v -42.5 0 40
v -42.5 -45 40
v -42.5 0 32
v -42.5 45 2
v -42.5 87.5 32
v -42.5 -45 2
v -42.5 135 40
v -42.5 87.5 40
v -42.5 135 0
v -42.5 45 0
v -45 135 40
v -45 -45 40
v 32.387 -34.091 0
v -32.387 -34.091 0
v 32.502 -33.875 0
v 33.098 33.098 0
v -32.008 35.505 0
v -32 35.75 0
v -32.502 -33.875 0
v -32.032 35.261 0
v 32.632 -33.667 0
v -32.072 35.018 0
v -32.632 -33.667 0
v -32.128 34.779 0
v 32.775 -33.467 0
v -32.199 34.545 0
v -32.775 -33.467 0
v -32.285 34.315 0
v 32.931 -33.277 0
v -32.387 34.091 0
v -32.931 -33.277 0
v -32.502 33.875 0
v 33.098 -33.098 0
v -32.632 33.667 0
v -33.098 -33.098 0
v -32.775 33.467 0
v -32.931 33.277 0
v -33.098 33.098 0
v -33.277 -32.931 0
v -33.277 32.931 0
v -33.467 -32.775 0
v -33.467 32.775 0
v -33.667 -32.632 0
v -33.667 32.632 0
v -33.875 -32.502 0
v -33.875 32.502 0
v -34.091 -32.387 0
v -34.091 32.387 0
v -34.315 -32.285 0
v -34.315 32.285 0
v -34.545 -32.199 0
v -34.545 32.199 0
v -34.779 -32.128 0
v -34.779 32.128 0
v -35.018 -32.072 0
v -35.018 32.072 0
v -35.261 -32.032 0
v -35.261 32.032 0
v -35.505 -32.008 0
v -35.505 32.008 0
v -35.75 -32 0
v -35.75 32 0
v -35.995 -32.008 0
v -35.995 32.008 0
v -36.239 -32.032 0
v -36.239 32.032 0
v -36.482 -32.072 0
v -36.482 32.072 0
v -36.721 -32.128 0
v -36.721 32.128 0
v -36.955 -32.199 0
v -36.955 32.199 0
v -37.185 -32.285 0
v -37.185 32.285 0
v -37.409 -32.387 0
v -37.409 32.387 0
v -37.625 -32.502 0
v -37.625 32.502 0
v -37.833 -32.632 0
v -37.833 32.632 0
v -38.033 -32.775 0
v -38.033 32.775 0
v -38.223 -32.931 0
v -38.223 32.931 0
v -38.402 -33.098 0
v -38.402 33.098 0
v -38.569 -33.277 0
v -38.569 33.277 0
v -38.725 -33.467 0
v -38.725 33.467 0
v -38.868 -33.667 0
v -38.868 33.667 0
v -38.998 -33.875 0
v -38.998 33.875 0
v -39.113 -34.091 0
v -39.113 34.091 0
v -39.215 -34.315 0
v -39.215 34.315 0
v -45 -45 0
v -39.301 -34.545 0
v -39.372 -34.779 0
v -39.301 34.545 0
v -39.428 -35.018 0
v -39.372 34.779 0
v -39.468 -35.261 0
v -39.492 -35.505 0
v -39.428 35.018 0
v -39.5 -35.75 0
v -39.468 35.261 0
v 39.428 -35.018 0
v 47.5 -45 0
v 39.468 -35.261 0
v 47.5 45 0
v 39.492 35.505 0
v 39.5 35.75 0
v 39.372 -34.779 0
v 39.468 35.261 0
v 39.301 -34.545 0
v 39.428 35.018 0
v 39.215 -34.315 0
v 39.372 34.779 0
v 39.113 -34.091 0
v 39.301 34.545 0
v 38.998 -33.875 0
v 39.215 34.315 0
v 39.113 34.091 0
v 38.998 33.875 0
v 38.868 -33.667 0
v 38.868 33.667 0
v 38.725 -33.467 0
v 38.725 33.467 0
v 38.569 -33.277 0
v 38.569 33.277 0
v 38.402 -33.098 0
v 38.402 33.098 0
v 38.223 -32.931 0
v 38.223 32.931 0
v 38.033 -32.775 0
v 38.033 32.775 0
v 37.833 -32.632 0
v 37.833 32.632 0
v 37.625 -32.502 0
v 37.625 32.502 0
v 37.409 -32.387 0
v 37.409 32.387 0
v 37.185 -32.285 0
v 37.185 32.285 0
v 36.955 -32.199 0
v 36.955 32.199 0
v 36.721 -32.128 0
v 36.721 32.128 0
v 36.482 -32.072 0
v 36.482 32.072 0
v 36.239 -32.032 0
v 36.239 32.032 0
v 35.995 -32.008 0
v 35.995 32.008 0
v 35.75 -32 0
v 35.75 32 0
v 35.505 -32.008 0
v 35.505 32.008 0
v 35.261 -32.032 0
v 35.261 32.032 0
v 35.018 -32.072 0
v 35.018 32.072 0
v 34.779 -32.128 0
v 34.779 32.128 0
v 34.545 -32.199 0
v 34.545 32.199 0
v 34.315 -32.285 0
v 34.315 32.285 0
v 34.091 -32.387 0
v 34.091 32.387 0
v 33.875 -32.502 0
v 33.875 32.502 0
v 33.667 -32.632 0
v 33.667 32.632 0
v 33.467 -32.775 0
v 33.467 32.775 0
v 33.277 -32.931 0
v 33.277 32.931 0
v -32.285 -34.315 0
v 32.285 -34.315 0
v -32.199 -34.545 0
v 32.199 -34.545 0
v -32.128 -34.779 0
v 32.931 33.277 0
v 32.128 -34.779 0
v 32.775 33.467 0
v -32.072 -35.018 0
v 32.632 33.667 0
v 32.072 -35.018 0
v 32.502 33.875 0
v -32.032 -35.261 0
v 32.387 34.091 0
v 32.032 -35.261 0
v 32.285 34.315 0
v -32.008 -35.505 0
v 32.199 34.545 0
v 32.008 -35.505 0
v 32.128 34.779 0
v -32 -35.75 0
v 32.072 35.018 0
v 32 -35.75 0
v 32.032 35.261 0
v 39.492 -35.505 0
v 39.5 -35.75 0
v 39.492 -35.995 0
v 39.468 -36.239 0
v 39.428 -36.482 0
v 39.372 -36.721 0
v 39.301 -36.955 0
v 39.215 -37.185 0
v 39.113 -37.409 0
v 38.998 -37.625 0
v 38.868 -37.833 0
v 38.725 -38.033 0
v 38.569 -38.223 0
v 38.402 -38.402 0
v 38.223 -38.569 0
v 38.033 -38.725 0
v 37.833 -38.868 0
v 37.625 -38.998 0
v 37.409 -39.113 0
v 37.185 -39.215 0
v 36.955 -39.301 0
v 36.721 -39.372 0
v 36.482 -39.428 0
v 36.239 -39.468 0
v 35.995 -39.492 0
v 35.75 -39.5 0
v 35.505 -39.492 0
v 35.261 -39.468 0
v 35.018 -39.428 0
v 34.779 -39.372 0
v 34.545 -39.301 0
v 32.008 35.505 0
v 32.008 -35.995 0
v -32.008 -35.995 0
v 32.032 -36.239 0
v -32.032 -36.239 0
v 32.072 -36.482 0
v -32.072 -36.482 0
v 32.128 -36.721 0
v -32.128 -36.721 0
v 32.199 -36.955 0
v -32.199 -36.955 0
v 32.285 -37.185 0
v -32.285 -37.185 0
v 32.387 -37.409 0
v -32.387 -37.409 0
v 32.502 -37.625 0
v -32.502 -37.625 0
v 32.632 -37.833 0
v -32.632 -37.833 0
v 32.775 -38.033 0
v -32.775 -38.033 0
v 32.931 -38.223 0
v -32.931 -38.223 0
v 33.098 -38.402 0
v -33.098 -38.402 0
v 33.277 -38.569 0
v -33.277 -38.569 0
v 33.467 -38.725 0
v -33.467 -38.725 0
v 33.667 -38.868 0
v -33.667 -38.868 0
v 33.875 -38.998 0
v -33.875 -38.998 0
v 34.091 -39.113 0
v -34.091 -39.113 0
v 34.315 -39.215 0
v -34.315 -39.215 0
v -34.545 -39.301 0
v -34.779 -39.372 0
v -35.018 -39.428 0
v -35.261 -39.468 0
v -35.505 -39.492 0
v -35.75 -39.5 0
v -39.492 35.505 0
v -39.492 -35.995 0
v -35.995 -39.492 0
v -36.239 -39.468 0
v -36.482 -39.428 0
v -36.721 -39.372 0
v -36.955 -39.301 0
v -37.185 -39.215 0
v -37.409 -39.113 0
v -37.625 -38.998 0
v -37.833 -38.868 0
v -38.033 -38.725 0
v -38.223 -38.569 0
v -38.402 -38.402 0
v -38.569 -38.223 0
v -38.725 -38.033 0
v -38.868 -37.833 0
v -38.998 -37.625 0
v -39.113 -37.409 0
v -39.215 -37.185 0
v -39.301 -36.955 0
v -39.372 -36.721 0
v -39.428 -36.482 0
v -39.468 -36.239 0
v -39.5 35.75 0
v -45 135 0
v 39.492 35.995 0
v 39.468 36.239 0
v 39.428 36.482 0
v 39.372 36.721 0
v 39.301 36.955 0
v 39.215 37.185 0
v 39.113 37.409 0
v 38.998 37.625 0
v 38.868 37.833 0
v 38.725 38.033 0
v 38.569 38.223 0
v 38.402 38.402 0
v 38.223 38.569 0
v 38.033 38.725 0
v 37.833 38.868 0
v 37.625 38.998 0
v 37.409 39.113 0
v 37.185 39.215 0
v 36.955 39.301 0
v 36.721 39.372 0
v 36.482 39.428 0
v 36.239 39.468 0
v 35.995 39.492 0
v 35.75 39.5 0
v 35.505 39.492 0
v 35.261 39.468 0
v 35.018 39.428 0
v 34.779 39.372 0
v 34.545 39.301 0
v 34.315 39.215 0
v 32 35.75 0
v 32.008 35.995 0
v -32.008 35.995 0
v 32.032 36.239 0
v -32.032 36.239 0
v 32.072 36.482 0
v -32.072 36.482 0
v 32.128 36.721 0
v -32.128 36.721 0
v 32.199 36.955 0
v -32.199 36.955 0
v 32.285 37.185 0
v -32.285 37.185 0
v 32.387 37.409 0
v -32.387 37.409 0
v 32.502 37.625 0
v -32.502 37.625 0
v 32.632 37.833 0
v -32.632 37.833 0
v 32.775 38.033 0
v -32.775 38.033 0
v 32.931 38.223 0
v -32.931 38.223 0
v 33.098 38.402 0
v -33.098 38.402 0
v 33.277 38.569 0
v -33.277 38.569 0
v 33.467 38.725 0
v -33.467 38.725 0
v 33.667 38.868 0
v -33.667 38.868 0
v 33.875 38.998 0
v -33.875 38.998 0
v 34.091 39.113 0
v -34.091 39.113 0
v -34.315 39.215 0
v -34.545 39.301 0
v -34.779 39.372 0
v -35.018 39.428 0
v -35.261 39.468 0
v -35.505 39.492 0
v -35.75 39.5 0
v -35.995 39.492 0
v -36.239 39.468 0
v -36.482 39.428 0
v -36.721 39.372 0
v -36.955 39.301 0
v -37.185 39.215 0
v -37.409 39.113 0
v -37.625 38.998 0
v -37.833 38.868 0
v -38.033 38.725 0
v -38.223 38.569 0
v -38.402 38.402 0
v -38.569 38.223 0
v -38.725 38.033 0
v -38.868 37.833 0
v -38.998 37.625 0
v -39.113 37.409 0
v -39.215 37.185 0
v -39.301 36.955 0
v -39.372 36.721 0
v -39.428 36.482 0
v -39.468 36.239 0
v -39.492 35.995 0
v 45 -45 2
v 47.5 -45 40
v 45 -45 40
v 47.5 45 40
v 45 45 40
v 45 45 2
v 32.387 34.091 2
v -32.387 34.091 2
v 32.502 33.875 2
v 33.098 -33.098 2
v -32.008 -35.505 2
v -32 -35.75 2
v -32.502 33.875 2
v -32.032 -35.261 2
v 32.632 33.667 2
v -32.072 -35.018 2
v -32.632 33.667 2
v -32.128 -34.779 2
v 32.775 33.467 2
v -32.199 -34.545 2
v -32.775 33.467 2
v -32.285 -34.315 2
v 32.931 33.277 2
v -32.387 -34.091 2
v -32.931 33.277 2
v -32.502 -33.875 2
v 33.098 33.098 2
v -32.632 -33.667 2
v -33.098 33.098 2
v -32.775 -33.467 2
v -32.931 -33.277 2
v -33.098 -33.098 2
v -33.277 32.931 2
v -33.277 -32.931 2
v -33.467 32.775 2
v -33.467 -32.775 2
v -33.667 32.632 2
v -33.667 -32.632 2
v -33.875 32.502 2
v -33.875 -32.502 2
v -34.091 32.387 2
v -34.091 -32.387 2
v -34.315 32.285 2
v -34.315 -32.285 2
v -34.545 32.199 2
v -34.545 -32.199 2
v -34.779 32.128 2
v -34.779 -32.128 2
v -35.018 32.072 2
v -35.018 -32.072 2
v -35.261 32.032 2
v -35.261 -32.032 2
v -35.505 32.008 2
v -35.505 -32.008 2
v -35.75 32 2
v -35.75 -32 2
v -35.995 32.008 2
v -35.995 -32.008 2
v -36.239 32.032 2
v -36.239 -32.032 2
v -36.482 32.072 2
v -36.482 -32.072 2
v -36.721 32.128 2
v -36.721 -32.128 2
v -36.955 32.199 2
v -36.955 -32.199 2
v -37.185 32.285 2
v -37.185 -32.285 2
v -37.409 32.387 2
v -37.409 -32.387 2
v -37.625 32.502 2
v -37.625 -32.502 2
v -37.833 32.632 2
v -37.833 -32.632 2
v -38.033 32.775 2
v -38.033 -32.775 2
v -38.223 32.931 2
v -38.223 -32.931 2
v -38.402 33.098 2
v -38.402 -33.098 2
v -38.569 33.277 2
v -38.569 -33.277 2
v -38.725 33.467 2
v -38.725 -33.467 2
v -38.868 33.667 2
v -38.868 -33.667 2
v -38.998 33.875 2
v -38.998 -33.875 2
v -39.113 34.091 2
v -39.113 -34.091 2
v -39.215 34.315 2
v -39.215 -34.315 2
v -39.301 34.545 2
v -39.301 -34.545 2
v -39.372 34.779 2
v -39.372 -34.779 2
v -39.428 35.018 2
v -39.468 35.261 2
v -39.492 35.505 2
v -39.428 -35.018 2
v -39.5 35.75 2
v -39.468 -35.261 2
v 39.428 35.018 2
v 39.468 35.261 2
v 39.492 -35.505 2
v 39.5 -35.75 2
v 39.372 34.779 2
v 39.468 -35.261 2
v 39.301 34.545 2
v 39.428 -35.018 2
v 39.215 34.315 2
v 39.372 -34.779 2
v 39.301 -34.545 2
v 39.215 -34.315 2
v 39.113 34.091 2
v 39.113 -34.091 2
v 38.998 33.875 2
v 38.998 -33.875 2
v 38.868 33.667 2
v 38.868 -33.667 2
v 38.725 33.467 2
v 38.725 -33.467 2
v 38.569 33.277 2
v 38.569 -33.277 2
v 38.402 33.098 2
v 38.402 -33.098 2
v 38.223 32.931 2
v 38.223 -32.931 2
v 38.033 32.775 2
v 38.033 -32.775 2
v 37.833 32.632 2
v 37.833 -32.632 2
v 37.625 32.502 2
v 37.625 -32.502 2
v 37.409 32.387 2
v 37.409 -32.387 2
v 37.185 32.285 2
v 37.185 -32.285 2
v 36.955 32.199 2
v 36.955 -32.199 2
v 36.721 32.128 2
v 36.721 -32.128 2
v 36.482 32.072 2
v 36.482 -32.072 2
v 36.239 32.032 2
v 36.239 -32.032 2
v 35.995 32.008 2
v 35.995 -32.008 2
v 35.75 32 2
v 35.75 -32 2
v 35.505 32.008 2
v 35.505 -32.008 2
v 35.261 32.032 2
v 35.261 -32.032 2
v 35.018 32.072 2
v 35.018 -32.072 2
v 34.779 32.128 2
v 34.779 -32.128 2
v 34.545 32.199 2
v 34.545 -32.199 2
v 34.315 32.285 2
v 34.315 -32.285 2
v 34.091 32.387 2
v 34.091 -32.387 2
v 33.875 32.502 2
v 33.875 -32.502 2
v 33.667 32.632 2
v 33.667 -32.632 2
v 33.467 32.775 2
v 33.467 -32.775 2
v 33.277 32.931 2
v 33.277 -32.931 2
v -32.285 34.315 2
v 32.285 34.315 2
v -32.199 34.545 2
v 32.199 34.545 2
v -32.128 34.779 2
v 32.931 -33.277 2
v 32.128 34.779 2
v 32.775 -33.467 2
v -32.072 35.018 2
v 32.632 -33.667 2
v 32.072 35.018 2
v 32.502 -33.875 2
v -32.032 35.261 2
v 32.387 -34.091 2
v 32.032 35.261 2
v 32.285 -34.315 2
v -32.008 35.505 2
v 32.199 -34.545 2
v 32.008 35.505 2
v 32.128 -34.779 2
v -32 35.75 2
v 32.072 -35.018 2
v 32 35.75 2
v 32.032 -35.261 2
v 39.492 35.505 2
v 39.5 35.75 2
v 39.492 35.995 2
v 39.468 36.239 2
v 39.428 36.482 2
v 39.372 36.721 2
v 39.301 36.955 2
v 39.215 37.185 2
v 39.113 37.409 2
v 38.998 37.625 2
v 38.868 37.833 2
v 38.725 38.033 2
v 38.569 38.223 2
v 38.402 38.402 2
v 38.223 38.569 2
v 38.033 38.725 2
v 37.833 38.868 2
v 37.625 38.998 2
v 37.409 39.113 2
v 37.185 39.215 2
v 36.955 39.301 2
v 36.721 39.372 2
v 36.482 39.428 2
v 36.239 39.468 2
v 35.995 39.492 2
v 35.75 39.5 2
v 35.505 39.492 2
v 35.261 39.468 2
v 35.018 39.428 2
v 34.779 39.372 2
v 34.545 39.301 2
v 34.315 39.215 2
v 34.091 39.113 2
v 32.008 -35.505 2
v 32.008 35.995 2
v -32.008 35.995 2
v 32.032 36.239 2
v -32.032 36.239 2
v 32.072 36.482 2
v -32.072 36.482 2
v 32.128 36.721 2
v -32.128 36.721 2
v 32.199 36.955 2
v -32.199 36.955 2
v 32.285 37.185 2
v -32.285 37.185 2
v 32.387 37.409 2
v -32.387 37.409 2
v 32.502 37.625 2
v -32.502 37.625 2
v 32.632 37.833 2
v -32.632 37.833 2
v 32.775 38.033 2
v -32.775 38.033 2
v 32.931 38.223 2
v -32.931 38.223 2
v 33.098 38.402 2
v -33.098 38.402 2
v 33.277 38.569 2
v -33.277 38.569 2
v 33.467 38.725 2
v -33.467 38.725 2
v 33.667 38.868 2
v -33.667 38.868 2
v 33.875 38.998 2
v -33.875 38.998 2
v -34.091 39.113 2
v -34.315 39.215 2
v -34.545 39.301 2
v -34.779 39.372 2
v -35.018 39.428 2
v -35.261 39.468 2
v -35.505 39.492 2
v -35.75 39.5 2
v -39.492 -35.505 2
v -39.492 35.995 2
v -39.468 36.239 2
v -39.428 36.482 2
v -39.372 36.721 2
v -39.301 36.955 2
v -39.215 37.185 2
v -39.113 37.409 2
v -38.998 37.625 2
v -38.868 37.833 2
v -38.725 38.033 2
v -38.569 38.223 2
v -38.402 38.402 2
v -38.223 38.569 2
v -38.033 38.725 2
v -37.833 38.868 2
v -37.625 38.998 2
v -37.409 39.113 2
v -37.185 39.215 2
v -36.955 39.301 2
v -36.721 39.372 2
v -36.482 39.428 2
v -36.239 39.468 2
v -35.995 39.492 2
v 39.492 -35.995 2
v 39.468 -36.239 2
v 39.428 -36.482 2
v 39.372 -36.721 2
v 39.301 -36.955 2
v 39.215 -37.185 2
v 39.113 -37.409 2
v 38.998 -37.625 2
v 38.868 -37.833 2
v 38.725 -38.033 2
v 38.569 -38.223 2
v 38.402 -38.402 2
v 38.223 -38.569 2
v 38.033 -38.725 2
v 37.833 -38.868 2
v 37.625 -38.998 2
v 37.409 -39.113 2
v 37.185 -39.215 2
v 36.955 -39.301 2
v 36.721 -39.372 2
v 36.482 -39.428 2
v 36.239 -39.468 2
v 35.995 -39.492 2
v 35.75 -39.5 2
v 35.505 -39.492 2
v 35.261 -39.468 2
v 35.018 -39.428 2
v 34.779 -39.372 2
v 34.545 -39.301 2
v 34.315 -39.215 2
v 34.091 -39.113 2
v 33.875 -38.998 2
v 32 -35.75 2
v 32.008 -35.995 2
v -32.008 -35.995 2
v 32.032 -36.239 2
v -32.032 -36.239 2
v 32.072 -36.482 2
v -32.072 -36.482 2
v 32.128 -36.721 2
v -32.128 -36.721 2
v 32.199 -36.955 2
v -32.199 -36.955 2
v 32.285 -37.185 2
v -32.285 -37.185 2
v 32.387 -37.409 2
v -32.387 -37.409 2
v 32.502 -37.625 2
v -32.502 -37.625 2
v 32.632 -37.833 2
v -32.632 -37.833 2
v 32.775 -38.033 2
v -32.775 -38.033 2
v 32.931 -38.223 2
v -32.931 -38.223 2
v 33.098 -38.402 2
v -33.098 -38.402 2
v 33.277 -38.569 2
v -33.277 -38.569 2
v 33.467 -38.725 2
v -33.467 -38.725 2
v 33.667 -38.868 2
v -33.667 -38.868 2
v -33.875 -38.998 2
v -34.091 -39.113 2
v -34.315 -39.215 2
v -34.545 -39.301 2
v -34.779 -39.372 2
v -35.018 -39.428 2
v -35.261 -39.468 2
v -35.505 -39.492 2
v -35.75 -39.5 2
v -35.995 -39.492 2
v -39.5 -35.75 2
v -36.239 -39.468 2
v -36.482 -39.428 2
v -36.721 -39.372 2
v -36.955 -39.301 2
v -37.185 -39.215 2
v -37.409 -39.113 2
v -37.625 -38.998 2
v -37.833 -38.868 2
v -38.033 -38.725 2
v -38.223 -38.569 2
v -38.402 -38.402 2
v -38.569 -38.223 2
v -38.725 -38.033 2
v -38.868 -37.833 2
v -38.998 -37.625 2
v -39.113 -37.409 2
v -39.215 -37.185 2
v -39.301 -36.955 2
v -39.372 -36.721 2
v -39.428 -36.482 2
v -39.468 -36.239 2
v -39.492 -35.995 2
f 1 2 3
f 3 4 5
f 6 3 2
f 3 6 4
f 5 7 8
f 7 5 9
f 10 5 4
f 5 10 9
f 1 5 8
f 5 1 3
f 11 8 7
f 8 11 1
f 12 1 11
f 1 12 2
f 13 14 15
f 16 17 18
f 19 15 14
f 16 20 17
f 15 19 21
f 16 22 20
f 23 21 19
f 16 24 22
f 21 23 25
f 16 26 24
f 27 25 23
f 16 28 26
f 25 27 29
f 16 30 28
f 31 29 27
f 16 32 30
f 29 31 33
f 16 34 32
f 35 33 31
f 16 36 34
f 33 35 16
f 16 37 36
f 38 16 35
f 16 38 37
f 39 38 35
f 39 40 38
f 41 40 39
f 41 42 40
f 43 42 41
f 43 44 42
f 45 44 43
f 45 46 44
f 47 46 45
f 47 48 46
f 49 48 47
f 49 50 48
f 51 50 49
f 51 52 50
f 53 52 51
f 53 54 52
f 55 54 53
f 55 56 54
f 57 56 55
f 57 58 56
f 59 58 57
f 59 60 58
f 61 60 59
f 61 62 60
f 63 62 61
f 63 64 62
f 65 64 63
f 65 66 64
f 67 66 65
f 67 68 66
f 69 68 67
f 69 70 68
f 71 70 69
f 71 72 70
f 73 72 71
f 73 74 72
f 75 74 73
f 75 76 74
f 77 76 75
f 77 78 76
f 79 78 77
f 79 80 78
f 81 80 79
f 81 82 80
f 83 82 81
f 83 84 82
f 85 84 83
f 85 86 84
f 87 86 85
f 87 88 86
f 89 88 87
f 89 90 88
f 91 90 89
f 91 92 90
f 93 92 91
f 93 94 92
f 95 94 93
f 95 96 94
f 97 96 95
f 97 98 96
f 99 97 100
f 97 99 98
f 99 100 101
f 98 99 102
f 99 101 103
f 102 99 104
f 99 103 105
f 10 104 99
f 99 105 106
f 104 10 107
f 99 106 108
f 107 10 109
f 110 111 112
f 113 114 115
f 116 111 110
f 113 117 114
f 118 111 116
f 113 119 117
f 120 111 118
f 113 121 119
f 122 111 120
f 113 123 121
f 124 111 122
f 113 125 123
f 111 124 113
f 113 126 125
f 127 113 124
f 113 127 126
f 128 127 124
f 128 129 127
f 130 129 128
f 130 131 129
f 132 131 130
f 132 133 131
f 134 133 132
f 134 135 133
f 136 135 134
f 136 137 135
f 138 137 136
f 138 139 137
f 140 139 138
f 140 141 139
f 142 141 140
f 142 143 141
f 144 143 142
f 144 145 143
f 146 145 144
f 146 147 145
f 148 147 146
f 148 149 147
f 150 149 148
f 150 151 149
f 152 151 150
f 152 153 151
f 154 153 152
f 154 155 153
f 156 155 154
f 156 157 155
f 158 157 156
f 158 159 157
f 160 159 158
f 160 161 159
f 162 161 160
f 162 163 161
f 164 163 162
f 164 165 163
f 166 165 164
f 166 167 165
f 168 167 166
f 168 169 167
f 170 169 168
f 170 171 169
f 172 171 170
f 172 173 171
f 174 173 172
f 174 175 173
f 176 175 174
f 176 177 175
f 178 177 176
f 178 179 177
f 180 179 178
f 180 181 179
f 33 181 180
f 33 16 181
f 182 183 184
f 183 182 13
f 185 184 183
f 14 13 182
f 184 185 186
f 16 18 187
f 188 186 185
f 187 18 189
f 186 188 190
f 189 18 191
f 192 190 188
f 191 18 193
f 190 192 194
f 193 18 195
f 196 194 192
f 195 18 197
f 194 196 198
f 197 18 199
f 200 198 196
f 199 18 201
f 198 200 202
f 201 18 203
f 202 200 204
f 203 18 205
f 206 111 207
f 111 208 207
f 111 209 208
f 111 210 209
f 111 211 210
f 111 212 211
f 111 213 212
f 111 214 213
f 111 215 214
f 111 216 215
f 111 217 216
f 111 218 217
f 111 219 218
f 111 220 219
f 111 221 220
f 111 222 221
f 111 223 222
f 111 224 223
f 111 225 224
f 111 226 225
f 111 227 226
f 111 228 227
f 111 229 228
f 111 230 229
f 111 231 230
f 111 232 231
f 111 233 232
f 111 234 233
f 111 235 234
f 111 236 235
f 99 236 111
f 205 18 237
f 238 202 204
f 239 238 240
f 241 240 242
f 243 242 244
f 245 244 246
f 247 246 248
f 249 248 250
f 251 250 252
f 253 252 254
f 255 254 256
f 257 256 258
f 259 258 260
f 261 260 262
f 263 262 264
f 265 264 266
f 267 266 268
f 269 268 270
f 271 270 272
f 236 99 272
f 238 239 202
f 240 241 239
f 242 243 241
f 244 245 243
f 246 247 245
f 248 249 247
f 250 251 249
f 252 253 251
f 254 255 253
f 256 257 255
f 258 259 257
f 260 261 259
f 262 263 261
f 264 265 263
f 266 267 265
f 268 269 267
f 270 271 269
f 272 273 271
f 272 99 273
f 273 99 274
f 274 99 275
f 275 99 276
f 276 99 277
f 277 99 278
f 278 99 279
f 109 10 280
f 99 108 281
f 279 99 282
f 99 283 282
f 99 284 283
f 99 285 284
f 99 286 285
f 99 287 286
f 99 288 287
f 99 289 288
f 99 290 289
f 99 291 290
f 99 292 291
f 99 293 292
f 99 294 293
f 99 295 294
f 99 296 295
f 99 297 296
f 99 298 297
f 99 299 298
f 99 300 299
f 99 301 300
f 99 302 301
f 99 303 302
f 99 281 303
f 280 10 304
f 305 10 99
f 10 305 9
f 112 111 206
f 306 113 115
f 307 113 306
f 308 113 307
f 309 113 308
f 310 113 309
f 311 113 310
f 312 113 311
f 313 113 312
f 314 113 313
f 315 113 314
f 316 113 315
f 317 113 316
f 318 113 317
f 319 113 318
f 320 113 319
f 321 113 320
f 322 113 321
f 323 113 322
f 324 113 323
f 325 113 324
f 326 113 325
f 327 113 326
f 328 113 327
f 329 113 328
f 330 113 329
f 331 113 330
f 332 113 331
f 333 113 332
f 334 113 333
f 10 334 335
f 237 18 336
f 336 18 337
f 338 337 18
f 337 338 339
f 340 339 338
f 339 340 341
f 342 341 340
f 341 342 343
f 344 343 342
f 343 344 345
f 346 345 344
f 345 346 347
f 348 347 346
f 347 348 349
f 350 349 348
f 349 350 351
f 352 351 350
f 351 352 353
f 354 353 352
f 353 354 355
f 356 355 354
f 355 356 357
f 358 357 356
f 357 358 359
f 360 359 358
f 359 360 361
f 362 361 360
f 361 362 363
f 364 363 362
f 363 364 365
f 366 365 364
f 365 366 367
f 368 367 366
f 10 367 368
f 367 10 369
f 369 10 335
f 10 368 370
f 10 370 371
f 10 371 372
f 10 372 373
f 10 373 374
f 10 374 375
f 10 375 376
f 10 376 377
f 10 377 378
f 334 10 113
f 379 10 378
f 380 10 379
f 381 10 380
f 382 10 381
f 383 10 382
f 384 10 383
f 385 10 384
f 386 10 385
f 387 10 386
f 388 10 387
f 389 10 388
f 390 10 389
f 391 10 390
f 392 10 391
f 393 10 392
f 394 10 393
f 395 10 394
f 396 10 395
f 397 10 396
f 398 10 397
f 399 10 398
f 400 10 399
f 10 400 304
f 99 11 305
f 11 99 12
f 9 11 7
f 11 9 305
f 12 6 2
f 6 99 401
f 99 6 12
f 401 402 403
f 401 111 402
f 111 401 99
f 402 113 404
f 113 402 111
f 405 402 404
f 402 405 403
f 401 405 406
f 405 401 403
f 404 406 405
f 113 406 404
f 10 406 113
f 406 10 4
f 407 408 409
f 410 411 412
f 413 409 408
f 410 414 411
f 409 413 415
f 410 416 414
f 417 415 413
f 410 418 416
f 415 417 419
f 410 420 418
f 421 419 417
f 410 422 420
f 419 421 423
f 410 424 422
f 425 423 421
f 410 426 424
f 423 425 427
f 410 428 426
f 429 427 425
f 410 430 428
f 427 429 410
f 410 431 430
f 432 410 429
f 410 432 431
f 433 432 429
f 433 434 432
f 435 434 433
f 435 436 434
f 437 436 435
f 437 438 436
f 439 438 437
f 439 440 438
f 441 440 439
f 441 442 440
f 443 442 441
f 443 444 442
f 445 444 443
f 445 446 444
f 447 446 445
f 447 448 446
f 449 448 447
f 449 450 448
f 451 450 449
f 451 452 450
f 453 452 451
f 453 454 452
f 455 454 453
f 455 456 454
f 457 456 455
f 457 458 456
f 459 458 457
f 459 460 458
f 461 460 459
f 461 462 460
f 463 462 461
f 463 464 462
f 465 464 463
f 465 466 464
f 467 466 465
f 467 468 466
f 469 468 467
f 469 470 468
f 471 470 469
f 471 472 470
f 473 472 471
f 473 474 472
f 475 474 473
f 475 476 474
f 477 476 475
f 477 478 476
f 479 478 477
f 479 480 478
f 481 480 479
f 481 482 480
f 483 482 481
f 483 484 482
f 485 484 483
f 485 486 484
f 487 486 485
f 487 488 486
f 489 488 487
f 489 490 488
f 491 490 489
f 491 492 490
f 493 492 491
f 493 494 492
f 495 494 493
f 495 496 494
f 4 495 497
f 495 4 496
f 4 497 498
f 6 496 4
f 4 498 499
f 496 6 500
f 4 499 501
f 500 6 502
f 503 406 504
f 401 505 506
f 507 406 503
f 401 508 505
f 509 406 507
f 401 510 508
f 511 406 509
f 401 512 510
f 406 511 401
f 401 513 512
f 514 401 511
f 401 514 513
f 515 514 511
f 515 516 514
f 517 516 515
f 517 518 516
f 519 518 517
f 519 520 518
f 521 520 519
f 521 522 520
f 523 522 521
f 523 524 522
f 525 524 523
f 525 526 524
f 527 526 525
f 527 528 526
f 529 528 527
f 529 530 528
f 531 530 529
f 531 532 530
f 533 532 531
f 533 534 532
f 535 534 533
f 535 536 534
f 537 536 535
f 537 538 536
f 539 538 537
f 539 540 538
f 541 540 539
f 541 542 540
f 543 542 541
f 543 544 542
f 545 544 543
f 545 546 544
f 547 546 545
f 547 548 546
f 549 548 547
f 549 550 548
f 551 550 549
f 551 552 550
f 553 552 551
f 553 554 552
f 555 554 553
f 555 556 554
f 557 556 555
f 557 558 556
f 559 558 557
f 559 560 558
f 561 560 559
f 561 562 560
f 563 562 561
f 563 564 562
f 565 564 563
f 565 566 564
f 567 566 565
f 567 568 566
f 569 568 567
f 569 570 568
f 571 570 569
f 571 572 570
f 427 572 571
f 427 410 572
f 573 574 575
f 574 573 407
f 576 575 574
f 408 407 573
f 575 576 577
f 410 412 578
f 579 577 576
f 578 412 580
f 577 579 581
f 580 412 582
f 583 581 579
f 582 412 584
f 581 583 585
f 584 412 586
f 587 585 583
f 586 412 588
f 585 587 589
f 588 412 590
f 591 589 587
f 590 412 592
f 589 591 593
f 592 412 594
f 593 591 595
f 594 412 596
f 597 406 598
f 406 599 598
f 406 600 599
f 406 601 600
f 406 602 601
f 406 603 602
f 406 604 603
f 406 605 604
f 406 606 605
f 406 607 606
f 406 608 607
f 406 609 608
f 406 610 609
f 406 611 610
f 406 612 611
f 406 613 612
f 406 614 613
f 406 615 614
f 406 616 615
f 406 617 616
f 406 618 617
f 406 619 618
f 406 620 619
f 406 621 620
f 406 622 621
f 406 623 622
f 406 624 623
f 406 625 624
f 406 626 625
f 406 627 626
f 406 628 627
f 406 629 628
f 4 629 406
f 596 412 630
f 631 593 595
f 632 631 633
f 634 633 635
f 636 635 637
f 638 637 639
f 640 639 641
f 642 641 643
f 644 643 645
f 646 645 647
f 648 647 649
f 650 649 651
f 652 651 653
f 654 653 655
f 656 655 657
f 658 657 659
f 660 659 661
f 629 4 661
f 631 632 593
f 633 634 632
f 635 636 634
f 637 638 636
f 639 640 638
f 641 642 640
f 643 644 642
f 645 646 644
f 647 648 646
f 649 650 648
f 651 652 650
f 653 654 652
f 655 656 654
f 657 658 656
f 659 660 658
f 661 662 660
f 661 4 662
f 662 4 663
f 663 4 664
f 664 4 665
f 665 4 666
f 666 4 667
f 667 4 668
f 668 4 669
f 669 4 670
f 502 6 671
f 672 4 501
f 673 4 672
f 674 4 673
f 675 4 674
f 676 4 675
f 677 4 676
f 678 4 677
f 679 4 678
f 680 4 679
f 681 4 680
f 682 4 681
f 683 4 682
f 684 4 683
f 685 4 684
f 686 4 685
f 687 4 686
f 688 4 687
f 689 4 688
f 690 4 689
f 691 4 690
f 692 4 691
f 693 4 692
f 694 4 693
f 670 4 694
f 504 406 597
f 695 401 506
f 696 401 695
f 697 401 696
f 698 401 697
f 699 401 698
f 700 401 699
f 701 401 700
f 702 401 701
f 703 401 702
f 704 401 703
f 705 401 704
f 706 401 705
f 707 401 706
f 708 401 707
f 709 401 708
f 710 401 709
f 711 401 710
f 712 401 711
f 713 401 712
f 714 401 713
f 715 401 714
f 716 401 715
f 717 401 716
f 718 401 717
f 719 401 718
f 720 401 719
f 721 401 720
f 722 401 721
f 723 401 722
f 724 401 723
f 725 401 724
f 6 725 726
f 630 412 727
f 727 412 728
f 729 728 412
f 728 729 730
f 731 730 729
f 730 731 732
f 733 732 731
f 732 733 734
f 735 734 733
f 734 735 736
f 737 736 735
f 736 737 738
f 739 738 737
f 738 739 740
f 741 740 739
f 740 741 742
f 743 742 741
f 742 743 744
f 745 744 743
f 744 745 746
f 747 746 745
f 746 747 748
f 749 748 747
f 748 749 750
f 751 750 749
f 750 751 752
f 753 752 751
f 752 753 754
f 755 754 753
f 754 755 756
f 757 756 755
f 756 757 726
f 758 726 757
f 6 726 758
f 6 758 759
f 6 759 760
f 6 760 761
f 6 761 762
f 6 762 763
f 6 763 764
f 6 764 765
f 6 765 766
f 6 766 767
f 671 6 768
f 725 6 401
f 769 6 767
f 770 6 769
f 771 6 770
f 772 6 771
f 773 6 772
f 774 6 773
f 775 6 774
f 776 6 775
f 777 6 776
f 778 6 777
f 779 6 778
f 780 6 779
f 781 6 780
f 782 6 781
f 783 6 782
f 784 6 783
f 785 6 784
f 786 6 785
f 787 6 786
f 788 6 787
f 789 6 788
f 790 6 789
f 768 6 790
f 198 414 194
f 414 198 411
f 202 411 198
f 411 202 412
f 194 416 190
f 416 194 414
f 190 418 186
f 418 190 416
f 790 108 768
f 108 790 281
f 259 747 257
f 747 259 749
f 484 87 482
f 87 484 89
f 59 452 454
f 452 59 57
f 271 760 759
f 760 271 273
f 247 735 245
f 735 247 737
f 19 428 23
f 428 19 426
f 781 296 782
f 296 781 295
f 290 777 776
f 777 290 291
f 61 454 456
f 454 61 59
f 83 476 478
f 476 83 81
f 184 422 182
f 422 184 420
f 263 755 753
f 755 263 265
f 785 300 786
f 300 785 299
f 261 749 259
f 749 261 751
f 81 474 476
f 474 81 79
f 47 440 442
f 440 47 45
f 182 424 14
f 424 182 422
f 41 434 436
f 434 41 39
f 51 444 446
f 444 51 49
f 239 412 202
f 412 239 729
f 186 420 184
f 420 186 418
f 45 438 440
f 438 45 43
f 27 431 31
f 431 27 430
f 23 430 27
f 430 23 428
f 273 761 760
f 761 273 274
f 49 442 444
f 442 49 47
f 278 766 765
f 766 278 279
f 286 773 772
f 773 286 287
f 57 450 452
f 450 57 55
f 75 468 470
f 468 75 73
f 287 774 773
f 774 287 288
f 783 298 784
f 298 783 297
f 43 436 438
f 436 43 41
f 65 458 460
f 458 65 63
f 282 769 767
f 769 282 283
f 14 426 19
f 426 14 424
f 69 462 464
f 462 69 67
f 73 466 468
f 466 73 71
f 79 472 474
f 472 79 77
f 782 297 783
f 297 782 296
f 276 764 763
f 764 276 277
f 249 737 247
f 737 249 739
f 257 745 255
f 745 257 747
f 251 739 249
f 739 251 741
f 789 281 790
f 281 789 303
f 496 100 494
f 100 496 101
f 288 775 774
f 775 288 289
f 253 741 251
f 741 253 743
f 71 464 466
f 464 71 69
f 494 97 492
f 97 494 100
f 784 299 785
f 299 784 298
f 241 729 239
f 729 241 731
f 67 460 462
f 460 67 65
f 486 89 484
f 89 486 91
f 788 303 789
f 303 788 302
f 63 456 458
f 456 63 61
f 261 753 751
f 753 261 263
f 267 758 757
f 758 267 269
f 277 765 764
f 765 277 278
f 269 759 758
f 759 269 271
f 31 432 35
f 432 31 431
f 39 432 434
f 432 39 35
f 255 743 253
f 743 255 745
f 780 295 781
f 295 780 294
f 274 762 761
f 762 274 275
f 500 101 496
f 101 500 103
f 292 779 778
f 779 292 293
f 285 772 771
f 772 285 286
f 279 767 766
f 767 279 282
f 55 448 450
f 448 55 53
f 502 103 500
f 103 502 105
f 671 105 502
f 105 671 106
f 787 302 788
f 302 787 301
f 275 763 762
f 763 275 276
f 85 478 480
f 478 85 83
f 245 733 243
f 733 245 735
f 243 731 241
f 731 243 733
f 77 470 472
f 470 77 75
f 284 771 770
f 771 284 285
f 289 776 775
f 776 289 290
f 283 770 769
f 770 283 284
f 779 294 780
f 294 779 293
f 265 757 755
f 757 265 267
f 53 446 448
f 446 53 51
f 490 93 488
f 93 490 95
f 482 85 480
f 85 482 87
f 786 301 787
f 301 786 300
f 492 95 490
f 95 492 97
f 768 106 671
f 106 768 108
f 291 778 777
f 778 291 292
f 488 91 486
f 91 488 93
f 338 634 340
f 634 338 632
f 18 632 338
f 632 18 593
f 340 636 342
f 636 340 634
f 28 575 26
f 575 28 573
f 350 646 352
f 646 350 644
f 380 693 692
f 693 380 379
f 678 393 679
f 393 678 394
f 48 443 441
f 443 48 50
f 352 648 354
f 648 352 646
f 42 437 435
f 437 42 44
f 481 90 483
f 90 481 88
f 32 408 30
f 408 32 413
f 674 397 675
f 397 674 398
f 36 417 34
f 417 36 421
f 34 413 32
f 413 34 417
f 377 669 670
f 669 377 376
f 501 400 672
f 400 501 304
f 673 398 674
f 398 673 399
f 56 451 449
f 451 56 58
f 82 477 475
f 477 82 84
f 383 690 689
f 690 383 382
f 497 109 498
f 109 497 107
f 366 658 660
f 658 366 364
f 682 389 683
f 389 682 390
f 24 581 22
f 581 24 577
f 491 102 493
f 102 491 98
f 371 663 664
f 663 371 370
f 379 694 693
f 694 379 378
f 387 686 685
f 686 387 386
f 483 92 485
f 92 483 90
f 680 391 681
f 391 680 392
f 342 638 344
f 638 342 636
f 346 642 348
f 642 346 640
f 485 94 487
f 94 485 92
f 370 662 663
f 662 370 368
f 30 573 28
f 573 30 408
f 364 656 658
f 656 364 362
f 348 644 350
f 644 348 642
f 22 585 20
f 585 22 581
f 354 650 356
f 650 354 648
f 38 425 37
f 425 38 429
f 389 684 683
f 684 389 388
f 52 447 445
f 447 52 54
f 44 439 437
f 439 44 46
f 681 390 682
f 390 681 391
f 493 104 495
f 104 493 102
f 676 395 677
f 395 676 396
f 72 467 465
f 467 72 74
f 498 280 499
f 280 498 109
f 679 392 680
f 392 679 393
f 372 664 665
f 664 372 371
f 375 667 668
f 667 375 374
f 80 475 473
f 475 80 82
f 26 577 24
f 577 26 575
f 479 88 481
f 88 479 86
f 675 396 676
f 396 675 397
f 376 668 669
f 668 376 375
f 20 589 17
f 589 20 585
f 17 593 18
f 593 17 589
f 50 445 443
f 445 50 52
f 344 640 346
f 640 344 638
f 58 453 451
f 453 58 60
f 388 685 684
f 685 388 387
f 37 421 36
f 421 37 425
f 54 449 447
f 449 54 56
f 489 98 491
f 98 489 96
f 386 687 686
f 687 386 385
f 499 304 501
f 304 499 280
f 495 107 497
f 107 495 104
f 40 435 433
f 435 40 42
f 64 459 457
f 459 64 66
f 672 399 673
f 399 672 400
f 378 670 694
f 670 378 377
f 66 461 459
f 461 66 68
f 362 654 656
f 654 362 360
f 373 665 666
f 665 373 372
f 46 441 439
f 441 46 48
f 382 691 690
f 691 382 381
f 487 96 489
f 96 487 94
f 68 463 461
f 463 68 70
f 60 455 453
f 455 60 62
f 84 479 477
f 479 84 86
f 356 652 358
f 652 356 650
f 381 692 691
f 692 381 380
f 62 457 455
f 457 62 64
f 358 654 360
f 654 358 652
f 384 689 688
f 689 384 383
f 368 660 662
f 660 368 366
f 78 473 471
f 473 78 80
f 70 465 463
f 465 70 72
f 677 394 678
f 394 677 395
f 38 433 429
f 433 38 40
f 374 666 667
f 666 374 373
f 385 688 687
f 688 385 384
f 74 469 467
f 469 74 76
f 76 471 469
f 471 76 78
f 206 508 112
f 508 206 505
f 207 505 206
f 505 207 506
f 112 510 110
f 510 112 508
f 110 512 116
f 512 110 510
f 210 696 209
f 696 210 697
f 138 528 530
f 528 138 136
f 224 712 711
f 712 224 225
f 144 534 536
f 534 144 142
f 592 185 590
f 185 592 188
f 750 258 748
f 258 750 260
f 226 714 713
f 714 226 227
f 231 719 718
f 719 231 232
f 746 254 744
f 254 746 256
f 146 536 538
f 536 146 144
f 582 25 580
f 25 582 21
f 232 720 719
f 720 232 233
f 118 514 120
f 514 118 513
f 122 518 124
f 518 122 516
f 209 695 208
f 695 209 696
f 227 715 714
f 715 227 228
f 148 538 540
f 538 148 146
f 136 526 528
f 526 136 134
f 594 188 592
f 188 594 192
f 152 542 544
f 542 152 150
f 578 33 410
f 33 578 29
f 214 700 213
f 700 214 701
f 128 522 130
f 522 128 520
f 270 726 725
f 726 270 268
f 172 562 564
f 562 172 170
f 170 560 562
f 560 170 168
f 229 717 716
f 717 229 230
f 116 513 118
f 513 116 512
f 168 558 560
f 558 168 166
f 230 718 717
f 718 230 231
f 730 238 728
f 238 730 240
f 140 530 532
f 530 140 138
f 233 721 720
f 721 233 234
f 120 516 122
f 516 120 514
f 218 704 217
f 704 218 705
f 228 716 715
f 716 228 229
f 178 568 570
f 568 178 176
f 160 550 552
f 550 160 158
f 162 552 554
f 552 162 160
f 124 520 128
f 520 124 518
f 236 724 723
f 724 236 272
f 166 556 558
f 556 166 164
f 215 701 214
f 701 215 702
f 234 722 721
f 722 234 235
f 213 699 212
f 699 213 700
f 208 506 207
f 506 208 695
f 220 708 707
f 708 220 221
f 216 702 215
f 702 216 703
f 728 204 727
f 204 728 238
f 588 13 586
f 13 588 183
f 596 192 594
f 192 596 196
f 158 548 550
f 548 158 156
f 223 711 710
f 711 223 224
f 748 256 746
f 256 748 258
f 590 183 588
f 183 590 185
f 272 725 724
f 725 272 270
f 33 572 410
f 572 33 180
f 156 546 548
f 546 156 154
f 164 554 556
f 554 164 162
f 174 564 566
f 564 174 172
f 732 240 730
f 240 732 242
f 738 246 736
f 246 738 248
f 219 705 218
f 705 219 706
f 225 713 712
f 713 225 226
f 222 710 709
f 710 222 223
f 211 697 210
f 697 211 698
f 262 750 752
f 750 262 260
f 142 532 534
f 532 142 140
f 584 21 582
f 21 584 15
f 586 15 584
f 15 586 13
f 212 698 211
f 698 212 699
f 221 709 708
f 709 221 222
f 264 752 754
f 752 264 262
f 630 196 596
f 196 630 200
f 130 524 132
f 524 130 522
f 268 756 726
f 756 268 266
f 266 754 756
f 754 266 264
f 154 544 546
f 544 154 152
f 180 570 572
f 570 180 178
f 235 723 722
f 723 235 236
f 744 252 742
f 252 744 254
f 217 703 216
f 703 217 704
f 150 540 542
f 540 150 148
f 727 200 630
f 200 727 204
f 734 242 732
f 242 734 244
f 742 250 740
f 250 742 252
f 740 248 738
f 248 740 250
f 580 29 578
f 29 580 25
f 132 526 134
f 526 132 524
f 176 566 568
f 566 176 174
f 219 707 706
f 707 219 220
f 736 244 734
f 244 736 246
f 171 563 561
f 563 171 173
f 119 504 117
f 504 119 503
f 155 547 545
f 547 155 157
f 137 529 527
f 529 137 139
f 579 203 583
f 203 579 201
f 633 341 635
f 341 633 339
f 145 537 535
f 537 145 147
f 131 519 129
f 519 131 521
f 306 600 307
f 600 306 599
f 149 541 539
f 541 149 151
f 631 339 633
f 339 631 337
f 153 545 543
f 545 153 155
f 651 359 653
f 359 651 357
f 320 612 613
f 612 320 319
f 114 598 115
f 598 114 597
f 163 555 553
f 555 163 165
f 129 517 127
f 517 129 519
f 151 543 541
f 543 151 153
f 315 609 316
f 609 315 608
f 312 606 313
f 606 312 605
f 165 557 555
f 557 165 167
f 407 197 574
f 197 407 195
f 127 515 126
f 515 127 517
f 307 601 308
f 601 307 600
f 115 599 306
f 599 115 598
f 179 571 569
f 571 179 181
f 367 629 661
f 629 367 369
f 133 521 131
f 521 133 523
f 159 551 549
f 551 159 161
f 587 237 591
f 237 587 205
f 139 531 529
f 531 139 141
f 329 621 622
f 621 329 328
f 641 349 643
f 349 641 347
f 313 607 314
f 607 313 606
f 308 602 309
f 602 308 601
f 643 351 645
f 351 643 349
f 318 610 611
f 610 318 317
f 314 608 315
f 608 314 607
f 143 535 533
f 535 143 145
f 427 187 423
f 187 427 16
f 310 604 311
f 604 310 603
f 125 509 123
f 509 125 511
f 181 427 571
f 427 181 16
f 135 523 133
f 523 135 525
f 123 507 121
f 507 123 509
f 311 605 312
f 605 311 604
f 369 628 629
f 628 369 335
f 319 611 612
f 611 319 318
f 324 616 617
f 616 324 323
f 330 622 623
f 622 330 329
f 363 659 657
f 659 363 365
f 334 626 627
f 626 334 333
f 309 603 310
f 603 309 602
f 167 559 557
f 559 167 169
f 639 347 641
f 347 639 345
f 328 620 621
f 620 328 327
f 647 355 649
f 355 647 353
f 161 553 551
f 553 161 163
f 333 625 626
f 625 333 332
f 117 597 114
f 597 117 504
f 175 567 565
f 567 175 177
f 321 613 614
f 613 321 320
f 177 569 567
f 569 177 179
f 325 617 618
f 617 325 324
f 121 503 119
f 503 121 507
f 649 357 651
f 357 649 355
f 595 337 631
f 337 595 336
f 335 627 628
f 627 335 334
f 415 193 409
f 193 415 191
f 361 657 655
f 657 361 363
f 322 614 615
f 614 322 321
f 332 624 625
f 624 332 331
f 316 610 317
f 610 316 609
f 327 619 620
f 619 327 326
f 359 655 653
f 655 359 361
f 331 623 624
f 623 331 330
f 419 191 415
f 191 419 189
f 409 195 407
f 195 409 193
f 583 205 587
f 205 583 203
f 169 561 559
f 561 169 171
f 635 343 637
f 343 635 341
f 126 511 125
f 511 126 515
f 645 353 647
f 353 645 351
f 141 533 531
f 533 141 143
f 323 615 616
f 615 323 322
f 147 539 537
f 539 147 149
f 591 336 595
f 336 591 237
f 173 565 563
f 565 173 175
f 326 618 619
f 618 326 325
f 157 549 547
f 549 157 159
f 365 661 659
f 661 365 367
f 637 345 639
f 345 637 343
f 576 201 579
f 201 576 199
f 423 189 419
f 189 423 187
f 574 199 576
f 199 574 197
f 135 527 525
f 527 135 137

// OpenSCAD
// DIY magnetic stirrer housing - print orientation (upside down)
// Units: mm. Walls 2.5 mm thick. Open box, closed top = stirring surface.

// ---------- Parameters ----------
fan_d          = 80;     // fan diameter
outer_x        = 90;     // outer size in X
outer_y        = 90;     // outer size in Y
top_t          = 2;      // top plate thickness (z = 0 to 2)
wall_t         = 2.5;    // wall thickness
box_h          = 40;     // total height of box (open at top)
screw_d        = 4.5;    // M4 screw hole diameter
screw_pitch    = 1.5;    // M4 screw pitch (for clearance)
screw_pattern  = 71.5;   // square pitch of screw holes
notch_w        = 12;     // cable notch width
notch_depth    = 8;      // cable notch depth from open edge
eps            = 0.5;    // cutter overshoot past faces

$fn = 96;

// ---------- Model ----------
difference() {
    union() {
        // Top plate (lies on bed in print orientation)
        translate([-outer_x/2, -outer_y/2, 0])
            cube([outer_x, outer_y, top_t]);

        // Four walls rising from the plate to the open top
        for (dx = [-outer_x/2, outer_x/2])
            for (dy = [-outer_y/2, outer_y/2])
                translate([dx, dy, 0])
                    cube([wall_t, outer_y - dy + dx < 0 ? outer_x - dx + dy : outer_x - dx - dy, box_h]);
    }

    // Four M4 screw holes through the top plate on a centred square pattern
    for (sx = [-screw_pattern/2, screw_pattern/2],
         sy = [-screw_pattern/2, screw_pattern/2])
        translate([sx, sy, -eps])
            cylinder(d = screw_d + 2*screw_pitch, h = top_t + 2*eps);

    // Cable notch in one wall: 12 mm wide, centred along the wall,
    // reaching 8 mm down from the open edge (z = 32 to z = 40)
    translate([-outer_x/2 + wall_t, 0, box_h - notch_depth])
        cube([notch_w, outer_y - wall_t, notch_depth]);
}
